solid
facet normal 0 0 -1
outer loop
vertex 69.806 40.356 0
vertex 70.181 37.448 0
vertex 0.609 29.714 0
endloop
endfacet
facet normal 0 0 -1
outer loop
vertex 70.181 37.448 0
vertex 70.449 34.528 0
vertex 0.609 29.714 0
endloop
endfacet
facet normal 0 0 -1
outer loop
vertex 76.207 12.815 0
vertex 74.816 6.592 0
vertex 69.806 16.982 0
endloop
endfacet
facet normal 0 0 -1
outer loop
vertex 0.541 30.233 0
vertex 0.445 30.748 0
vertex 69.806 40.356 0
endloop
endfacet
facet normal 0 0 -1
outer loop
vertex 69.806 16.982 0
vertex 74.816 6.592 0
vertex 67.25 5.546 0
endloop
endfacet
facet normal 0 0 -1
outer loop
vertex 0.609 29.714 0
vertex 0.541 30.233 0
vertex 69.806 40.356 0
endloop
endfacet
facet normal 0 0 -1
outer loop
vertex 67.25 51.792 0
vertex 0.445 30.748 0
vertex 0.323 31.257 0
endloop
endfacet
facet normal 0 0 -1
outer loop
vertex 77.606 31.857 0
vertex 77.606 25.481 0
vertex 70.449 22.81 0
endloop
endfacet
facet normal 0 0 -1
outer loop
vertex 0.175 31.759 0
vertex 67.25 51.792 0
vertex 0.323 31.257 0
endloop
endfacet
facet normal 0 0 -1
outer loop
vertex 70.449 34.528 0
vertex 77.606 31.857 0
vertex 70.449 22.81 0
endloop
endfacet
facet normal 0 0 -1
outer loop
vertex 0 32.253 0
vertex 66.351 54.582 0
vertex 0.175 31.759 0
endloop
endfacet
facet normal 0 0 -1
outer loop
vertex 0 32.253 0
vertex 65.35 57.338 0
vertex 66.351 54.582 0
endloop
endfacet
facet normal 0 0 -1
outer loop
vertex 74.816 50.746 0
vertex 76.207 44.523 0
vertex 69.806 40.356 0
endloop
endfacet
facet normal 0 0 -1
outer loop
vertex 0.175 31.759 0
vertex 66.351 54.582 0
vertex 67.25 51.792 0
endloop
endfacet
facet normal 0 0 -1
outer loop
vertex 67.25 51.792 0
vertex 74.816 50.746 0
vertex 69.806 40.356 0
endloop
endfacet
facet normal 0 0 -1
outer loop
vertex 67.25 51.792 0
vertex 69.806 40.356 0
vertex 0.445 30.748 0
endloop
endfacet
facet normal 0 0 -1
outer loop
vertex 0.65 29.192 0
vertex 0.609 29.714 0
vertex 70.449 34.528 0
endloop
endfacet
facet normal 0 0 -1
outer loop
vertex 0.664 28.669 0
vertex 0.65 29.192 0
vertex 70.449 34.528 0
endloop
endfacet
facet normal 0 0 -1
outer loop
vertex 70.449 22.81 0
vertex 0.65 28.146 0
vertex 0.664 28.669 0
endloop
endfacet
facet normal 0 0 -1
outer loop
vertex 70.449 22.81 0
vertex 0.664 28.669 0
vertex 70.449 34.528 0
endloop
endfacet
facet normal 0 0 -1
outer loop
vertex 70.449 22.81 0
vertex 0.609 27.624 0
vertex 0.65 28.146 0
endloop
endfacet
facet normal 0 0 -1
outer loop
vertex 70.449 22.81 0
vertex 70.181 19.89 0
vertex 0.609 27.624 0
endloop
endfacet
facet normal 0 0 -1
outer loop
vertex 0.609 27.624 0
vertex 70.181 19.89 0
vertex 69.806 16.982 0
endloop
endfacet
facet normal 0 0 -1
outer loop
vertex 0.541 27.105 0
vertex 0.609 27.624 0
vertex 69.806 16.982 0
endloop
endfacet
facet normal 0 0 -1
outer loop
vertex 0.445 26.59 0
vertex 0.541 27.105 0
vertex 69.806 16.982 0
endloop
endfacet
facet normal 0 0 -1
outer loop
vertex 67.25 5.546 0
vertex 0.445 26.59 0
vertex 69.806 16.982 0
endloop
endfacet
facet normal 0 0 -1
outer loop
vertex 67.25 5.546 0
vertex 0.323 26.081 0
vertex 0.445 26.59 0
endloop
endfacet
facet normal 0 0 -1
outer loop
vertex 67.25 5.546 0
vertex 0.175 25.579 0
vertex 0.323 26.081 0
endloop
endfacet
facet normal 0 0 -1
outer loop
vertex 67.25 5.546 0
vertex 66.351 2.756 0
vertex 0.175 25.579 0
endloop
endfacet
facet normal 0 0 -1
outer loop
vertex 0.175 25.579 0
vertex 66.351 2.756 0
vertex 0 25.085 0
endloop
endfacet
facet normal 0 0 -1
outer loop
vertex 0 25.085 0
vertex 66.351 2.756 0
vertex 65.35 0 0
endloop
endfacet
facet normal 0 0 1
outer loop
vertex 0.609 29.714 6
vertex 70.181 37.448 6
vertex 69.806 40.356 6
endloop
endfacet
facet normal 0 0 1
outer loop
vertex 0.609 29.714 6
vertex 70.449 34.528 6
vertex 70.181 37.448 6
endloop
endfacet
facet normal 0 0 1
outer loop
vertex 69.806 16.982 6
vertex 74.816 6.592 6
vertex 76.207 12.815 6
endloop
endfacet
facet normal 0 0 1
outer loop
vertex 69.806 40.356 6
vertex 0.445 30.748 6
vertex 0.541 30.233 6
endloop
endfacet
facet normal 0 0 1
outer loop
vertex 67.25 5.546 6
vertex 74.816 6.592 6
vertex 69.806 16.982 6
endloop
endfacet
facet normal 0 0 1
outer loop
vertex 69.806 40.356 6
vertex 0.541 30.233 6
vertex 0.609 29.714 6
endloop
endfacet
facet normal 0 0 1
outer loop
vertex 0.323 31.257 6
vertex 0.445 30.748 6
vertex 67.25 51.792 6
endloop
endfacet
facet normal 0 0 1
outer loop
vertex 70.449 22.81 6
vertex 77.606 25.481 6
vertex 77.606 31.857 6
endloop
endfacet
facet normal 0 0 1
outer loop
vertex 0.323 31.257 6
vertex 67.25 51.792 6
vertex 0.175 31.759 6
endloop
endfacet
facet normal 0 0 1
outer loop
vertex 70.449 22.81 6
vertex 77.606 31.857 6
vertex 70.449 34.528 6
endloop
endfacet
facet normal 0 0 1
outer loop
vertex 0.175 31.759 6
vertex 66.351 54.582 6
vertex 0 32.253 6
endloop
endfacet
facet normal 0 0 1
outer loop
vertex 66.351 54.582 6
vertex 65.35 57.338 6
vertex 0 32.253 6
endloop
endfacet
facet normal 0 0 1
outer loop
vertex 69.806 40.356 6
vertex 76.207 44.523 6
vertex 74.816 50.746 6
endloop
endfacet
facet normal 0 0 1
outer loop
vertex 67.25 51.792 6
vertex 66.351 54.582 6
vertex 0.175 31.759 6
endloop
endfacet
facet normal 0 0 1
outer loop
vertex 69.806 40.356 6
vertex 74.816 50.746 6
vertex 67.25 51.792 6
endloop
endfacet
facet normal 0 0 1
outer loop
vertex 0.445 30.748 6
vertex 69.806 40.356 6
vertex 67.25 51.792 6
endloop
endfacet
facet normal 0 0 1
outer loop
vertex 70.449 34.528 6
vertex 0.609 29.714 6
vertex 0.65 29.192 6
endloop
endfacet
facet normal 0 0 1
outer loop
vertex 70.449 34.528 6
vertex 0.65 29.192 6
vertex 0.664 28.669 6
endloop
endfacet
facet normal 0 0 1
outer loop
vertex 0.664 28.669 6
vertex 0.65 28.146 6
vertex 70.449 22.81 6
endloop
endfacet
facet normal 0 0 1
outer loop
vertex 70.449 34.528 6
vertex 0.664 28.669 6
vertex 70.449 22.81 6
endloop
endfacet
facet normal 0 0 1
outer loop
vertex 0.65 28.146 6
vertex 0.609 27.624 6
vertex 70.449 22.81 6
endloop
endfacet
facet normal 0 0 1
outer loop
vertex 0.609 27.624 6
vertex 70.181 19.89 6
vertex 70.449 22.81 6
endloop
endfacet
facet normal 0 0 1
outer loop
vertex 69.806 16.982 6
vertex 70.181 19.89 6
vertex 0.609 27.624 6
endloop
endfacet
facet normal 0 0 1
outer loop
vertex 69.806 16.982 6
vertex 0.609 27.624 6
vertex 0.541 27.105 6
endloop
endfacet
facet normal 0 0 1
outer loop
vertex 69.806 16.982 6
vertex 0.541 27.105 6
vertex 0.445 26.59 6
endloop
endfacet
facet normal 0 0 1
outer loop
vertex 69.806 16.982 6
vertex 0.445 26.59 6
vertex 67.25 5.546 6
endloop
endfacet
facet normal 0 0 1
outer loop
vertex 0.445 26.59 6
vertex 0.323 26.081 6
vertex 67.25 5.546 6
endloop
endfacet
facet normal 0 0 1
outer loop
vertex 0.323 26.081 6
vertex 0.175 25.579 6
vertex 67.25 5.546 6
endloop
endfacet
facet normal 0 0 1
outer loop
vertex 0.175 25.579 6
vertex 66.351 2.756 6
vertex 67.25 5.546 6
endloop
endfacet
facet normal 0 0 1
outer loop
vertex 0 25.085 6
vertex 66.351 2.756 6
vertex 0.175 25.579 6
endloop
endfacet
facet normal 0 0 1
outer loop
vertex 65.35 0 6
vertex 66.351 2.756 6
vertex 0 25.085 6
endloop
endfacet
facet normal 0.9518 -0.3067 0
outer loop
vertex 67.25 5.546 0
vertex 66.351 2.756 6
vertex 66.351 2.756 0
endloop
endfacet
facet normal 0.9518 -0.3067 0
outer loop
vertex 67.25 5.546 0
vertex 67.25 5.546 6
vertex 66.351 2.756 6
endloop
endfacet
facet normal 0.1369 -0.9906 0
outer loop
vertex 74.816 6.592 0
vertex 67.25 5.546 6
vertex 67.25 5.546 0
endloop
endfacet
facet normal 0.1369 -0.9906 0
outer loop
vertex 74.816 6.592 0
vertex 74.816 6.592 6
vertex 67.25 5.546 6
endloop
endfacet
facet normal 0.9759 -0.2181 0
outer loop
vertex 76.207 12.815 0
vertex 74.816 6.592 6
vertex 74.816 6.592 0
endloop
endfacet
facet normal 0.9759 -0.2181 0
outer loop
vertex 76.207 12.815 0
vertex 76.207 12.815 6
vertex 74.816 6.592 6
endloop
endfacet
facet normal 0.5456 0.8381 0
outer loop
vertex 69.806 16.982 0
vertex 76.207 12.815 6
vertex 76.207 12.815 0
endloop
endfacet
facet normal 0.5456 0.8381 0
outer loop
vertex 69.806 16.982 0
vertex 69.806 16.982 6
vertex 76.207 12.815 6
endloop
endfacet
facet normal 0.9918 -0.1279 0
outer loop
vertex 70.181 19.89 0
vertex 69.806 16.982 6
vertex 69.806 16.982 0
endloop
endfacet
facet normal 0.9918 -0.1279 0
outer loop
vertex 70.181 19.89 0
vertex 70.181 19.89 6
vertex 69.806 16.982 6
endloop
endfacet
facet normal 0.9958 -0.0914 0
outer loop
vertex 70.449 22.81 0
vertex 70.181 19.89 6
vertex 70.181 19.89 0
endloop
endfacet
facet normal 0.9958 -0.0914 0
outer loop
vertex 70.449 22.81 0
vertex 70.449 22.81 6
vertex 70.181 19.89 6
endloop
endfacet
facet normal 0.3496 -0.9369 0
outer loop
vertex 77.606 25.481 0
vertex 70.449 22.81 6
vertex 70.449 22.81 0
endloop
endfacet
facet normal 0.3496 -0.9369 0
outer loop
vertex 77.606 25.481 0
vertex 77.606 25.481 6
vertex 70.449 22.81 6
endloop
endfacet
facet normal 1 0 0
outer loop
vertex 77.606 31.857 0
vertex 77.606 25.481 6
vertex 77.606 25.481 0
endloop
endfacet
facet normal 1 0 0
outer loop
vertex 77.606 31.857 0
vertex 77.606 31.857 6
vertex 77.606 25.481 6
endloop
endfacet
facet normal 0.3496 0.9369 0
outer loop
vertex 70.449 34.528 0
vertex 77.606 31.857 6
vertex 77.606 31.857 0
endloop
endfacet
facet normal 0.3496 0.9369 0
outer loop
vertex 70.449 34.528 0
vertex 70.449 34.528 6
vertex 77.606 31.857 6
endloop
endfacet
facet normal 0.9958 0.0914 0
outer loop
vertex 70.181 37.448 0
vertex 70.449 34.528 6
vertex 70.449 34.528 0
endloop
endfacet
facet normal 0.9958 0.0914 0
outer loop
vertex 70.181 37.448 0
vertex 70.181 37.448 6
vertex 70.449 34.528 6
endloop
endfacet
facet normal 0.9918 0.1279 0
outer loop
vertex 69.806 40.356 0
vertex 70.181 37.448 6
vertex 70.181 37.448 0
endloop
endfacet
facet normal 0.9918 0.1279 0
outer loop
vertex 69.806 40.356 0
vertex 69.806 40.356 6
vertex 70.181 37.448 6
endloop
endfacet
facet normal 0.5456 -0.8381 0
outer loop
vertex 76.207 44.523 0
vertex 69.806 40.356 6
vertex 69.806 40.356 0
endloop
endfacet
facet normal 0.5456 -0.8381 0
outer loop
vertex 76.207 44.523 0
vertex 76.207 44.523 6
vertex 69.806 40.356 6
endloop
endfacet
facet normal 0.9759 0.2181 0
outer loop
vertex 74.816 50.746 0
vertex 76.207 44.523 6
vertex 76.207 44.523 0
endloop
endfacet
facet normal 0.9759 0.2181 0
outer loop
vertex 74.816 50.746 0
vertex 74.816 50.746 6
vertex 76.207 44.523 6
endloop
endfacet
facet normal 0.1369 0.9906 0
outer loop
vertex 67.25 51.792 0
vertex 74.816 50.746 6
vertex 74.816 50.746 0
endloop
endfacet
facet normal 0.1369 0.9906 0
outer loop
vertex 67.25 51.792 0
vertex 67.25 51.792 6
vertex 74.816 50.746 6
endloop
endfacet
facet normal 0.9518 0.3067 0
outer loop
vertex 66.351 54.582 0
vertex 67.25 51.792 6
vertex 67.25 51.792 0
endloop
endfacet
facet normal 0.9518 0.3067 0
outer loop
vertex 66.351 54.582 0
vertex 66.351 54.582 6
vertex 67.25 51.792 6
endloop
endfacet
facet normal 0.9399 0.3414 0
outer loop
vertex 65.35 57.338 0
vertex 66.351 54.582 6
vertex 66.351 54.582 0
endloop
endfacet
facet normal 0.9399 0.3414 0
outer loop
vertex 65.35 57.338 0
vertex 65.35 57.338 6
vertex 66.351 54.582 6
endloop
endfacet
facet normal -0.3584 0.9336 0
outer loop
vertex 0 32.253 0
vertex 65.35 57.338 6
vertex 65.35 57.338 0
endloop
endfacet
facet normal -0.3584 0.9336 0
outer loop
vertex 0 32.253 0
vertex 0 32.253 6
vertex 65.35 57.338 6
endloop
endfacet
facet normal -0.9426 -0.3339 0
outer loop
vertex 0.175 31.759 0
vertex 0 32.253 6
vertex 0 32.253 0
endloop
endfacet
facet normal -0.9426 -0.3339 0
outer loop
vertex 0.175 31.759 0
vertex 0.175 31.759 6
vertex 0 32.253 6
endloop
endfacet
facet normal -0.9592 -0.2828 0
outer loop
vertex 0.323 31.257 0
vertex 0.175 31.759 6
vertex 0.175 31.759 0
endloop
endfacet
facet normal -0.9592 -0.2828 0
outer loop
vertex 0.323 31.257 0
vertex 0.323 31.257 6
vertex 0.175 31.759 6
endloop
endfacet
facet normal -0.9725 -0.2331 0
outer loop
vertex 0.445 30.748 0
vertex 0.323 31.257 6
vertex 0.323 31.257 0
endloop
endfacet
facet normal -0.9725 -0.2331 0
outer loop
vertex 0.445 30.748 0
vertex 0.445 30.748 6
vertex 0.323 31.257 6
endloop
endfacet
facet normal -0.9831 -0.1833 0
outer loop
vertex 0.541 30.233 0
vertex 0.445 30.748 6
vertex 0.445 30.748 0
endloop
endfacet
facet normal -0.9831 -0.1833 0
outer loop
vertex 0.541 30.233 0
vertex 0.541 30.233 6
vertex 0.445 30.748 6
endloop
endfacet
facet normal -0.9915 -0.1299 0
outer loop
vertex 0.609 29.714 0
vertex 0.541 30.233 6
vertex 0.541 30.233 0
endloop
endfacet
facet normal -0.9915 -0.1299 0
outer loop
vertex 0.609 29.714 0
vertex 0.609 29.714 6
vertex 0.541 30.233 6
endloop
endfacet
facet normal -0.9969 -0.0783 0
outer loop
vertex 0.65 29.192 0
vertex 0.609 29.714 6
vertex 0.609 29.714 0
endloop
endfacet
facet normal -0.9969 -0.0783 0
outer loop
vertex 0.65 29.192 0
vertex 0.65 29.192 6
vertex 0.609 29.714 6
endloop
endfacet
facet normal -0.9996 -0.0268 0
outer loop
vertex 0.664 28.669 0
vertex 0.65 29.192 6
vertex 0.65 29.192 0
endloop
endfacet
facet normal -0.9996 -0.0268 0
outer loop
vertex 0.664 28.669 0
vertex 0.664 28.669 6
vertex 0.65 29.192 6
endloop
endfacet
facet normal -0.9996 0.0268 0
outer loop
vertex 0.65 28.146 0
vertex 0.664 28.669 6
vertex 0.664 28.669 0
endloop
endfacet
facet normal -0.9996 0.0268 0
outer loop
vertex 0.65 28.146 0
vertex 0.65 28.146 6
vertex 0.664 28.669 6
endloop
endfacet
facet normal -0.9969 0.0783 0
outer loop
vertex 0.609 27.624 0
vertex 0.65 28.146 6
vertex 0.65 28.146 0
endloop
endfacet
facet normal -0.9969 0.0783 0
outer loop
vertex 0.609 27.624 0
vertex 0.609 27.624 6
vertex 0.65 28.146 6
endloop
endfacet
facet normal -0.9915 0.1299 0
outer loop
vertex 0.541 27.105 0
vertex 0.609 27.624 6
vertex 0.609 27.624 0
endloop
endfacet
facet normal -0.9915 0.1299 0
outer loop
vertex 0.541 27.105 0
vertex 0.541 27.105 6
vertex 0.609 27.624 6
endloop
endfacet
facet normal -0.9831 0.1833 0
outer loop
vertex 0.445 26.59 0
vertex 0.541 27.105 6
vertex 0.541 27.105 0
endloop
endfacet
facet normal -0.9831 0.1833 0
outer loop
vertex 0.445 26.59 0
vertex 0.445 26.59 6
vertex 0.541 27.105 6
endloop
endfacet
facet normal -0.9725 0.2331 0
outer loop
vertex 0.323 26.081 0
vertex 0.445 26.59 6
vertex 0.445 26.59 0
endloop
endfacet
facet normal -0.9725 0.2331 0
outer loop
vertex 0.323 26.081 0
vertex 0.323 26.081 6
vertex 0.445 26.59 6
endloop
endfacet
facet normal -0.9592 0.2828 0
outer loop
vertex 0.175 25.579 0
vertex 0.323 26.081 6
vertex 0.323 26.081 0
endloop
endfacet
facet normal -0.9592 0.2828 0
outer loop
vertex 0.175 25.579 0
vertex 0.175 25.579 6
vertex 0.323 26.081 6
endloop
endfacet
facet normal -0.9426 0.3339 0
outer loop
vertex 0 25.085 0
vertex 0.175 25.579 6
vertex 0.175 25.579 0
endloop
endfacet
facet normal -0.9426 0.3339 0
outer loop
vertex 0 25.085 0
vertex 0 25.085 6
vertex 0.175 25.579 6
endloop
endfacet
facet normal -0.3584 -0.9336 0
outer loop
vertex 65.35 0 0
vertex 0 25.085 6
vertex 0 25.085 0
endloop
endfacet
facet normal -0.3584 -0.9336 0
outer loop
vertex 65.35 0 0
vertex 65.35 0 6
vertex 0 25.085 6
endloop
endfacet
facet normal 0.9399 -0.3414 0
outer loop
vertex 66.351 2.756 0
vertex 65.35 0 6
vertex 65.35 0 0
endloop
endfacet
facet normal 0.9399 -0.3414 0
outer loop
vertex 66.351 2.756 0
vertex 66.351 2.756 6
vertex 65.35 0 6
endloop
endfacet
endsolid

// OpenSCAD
$fn = 32;

// ----------------------------------------------------------------------
// Gear sector: 3 teeth on 42 degrees
// ----------------------------------------------------------------------

// --- parameters (mm) ---
sector_angle = 42;        // sector angle, degrees
root_r = 80;              // root circle radius
tooth_h = 7;              // tooth height over the root circle
teeth = 3;                // number of teeth on the sector
hub_r = 10;               // hub bore radius
plate_t = 6;              // sector thickness, Z
arc_step = 3;             // sampling step of the root/hub arcs, degrees

tip_r = root_r + tooth_h;  // tip circle radius

profile = [[65.35, 0], [66.351, 2.756], [67.25, 5.546], [74.816, 6.592], [76.207, 12.815], [69.806, 16.982], [70.181, 19.89], [70.449, 22.81], [77.606, 25.481], [77.606, 31.857], [70.449, 34.528], [70.181, 37.448], [69.806, 40.356], [76.207, 44.523], [74.816, 50.746], [67.25, 51.792], [66.351, 54.582], [65.35, 57.338], [0, 32.253], [0.175, 31.759], [0.323, 31.257], [0.445, 30.748], [0.541, 30.233], [0.609, 29.714], [0.65, 29.192], [0.664, 28.669], [0.65, 28.146], [0.609, 27.624], [0.541, 27.105], [0.445, 26.59], [0.323, 26.081], [0.175, 25.579], [0, 25.085]];  // primary outline, 33 points, counter clockwise

// --- the one profile operation ---
linear_extrude(height = plate_t) polygon(points = profile);
